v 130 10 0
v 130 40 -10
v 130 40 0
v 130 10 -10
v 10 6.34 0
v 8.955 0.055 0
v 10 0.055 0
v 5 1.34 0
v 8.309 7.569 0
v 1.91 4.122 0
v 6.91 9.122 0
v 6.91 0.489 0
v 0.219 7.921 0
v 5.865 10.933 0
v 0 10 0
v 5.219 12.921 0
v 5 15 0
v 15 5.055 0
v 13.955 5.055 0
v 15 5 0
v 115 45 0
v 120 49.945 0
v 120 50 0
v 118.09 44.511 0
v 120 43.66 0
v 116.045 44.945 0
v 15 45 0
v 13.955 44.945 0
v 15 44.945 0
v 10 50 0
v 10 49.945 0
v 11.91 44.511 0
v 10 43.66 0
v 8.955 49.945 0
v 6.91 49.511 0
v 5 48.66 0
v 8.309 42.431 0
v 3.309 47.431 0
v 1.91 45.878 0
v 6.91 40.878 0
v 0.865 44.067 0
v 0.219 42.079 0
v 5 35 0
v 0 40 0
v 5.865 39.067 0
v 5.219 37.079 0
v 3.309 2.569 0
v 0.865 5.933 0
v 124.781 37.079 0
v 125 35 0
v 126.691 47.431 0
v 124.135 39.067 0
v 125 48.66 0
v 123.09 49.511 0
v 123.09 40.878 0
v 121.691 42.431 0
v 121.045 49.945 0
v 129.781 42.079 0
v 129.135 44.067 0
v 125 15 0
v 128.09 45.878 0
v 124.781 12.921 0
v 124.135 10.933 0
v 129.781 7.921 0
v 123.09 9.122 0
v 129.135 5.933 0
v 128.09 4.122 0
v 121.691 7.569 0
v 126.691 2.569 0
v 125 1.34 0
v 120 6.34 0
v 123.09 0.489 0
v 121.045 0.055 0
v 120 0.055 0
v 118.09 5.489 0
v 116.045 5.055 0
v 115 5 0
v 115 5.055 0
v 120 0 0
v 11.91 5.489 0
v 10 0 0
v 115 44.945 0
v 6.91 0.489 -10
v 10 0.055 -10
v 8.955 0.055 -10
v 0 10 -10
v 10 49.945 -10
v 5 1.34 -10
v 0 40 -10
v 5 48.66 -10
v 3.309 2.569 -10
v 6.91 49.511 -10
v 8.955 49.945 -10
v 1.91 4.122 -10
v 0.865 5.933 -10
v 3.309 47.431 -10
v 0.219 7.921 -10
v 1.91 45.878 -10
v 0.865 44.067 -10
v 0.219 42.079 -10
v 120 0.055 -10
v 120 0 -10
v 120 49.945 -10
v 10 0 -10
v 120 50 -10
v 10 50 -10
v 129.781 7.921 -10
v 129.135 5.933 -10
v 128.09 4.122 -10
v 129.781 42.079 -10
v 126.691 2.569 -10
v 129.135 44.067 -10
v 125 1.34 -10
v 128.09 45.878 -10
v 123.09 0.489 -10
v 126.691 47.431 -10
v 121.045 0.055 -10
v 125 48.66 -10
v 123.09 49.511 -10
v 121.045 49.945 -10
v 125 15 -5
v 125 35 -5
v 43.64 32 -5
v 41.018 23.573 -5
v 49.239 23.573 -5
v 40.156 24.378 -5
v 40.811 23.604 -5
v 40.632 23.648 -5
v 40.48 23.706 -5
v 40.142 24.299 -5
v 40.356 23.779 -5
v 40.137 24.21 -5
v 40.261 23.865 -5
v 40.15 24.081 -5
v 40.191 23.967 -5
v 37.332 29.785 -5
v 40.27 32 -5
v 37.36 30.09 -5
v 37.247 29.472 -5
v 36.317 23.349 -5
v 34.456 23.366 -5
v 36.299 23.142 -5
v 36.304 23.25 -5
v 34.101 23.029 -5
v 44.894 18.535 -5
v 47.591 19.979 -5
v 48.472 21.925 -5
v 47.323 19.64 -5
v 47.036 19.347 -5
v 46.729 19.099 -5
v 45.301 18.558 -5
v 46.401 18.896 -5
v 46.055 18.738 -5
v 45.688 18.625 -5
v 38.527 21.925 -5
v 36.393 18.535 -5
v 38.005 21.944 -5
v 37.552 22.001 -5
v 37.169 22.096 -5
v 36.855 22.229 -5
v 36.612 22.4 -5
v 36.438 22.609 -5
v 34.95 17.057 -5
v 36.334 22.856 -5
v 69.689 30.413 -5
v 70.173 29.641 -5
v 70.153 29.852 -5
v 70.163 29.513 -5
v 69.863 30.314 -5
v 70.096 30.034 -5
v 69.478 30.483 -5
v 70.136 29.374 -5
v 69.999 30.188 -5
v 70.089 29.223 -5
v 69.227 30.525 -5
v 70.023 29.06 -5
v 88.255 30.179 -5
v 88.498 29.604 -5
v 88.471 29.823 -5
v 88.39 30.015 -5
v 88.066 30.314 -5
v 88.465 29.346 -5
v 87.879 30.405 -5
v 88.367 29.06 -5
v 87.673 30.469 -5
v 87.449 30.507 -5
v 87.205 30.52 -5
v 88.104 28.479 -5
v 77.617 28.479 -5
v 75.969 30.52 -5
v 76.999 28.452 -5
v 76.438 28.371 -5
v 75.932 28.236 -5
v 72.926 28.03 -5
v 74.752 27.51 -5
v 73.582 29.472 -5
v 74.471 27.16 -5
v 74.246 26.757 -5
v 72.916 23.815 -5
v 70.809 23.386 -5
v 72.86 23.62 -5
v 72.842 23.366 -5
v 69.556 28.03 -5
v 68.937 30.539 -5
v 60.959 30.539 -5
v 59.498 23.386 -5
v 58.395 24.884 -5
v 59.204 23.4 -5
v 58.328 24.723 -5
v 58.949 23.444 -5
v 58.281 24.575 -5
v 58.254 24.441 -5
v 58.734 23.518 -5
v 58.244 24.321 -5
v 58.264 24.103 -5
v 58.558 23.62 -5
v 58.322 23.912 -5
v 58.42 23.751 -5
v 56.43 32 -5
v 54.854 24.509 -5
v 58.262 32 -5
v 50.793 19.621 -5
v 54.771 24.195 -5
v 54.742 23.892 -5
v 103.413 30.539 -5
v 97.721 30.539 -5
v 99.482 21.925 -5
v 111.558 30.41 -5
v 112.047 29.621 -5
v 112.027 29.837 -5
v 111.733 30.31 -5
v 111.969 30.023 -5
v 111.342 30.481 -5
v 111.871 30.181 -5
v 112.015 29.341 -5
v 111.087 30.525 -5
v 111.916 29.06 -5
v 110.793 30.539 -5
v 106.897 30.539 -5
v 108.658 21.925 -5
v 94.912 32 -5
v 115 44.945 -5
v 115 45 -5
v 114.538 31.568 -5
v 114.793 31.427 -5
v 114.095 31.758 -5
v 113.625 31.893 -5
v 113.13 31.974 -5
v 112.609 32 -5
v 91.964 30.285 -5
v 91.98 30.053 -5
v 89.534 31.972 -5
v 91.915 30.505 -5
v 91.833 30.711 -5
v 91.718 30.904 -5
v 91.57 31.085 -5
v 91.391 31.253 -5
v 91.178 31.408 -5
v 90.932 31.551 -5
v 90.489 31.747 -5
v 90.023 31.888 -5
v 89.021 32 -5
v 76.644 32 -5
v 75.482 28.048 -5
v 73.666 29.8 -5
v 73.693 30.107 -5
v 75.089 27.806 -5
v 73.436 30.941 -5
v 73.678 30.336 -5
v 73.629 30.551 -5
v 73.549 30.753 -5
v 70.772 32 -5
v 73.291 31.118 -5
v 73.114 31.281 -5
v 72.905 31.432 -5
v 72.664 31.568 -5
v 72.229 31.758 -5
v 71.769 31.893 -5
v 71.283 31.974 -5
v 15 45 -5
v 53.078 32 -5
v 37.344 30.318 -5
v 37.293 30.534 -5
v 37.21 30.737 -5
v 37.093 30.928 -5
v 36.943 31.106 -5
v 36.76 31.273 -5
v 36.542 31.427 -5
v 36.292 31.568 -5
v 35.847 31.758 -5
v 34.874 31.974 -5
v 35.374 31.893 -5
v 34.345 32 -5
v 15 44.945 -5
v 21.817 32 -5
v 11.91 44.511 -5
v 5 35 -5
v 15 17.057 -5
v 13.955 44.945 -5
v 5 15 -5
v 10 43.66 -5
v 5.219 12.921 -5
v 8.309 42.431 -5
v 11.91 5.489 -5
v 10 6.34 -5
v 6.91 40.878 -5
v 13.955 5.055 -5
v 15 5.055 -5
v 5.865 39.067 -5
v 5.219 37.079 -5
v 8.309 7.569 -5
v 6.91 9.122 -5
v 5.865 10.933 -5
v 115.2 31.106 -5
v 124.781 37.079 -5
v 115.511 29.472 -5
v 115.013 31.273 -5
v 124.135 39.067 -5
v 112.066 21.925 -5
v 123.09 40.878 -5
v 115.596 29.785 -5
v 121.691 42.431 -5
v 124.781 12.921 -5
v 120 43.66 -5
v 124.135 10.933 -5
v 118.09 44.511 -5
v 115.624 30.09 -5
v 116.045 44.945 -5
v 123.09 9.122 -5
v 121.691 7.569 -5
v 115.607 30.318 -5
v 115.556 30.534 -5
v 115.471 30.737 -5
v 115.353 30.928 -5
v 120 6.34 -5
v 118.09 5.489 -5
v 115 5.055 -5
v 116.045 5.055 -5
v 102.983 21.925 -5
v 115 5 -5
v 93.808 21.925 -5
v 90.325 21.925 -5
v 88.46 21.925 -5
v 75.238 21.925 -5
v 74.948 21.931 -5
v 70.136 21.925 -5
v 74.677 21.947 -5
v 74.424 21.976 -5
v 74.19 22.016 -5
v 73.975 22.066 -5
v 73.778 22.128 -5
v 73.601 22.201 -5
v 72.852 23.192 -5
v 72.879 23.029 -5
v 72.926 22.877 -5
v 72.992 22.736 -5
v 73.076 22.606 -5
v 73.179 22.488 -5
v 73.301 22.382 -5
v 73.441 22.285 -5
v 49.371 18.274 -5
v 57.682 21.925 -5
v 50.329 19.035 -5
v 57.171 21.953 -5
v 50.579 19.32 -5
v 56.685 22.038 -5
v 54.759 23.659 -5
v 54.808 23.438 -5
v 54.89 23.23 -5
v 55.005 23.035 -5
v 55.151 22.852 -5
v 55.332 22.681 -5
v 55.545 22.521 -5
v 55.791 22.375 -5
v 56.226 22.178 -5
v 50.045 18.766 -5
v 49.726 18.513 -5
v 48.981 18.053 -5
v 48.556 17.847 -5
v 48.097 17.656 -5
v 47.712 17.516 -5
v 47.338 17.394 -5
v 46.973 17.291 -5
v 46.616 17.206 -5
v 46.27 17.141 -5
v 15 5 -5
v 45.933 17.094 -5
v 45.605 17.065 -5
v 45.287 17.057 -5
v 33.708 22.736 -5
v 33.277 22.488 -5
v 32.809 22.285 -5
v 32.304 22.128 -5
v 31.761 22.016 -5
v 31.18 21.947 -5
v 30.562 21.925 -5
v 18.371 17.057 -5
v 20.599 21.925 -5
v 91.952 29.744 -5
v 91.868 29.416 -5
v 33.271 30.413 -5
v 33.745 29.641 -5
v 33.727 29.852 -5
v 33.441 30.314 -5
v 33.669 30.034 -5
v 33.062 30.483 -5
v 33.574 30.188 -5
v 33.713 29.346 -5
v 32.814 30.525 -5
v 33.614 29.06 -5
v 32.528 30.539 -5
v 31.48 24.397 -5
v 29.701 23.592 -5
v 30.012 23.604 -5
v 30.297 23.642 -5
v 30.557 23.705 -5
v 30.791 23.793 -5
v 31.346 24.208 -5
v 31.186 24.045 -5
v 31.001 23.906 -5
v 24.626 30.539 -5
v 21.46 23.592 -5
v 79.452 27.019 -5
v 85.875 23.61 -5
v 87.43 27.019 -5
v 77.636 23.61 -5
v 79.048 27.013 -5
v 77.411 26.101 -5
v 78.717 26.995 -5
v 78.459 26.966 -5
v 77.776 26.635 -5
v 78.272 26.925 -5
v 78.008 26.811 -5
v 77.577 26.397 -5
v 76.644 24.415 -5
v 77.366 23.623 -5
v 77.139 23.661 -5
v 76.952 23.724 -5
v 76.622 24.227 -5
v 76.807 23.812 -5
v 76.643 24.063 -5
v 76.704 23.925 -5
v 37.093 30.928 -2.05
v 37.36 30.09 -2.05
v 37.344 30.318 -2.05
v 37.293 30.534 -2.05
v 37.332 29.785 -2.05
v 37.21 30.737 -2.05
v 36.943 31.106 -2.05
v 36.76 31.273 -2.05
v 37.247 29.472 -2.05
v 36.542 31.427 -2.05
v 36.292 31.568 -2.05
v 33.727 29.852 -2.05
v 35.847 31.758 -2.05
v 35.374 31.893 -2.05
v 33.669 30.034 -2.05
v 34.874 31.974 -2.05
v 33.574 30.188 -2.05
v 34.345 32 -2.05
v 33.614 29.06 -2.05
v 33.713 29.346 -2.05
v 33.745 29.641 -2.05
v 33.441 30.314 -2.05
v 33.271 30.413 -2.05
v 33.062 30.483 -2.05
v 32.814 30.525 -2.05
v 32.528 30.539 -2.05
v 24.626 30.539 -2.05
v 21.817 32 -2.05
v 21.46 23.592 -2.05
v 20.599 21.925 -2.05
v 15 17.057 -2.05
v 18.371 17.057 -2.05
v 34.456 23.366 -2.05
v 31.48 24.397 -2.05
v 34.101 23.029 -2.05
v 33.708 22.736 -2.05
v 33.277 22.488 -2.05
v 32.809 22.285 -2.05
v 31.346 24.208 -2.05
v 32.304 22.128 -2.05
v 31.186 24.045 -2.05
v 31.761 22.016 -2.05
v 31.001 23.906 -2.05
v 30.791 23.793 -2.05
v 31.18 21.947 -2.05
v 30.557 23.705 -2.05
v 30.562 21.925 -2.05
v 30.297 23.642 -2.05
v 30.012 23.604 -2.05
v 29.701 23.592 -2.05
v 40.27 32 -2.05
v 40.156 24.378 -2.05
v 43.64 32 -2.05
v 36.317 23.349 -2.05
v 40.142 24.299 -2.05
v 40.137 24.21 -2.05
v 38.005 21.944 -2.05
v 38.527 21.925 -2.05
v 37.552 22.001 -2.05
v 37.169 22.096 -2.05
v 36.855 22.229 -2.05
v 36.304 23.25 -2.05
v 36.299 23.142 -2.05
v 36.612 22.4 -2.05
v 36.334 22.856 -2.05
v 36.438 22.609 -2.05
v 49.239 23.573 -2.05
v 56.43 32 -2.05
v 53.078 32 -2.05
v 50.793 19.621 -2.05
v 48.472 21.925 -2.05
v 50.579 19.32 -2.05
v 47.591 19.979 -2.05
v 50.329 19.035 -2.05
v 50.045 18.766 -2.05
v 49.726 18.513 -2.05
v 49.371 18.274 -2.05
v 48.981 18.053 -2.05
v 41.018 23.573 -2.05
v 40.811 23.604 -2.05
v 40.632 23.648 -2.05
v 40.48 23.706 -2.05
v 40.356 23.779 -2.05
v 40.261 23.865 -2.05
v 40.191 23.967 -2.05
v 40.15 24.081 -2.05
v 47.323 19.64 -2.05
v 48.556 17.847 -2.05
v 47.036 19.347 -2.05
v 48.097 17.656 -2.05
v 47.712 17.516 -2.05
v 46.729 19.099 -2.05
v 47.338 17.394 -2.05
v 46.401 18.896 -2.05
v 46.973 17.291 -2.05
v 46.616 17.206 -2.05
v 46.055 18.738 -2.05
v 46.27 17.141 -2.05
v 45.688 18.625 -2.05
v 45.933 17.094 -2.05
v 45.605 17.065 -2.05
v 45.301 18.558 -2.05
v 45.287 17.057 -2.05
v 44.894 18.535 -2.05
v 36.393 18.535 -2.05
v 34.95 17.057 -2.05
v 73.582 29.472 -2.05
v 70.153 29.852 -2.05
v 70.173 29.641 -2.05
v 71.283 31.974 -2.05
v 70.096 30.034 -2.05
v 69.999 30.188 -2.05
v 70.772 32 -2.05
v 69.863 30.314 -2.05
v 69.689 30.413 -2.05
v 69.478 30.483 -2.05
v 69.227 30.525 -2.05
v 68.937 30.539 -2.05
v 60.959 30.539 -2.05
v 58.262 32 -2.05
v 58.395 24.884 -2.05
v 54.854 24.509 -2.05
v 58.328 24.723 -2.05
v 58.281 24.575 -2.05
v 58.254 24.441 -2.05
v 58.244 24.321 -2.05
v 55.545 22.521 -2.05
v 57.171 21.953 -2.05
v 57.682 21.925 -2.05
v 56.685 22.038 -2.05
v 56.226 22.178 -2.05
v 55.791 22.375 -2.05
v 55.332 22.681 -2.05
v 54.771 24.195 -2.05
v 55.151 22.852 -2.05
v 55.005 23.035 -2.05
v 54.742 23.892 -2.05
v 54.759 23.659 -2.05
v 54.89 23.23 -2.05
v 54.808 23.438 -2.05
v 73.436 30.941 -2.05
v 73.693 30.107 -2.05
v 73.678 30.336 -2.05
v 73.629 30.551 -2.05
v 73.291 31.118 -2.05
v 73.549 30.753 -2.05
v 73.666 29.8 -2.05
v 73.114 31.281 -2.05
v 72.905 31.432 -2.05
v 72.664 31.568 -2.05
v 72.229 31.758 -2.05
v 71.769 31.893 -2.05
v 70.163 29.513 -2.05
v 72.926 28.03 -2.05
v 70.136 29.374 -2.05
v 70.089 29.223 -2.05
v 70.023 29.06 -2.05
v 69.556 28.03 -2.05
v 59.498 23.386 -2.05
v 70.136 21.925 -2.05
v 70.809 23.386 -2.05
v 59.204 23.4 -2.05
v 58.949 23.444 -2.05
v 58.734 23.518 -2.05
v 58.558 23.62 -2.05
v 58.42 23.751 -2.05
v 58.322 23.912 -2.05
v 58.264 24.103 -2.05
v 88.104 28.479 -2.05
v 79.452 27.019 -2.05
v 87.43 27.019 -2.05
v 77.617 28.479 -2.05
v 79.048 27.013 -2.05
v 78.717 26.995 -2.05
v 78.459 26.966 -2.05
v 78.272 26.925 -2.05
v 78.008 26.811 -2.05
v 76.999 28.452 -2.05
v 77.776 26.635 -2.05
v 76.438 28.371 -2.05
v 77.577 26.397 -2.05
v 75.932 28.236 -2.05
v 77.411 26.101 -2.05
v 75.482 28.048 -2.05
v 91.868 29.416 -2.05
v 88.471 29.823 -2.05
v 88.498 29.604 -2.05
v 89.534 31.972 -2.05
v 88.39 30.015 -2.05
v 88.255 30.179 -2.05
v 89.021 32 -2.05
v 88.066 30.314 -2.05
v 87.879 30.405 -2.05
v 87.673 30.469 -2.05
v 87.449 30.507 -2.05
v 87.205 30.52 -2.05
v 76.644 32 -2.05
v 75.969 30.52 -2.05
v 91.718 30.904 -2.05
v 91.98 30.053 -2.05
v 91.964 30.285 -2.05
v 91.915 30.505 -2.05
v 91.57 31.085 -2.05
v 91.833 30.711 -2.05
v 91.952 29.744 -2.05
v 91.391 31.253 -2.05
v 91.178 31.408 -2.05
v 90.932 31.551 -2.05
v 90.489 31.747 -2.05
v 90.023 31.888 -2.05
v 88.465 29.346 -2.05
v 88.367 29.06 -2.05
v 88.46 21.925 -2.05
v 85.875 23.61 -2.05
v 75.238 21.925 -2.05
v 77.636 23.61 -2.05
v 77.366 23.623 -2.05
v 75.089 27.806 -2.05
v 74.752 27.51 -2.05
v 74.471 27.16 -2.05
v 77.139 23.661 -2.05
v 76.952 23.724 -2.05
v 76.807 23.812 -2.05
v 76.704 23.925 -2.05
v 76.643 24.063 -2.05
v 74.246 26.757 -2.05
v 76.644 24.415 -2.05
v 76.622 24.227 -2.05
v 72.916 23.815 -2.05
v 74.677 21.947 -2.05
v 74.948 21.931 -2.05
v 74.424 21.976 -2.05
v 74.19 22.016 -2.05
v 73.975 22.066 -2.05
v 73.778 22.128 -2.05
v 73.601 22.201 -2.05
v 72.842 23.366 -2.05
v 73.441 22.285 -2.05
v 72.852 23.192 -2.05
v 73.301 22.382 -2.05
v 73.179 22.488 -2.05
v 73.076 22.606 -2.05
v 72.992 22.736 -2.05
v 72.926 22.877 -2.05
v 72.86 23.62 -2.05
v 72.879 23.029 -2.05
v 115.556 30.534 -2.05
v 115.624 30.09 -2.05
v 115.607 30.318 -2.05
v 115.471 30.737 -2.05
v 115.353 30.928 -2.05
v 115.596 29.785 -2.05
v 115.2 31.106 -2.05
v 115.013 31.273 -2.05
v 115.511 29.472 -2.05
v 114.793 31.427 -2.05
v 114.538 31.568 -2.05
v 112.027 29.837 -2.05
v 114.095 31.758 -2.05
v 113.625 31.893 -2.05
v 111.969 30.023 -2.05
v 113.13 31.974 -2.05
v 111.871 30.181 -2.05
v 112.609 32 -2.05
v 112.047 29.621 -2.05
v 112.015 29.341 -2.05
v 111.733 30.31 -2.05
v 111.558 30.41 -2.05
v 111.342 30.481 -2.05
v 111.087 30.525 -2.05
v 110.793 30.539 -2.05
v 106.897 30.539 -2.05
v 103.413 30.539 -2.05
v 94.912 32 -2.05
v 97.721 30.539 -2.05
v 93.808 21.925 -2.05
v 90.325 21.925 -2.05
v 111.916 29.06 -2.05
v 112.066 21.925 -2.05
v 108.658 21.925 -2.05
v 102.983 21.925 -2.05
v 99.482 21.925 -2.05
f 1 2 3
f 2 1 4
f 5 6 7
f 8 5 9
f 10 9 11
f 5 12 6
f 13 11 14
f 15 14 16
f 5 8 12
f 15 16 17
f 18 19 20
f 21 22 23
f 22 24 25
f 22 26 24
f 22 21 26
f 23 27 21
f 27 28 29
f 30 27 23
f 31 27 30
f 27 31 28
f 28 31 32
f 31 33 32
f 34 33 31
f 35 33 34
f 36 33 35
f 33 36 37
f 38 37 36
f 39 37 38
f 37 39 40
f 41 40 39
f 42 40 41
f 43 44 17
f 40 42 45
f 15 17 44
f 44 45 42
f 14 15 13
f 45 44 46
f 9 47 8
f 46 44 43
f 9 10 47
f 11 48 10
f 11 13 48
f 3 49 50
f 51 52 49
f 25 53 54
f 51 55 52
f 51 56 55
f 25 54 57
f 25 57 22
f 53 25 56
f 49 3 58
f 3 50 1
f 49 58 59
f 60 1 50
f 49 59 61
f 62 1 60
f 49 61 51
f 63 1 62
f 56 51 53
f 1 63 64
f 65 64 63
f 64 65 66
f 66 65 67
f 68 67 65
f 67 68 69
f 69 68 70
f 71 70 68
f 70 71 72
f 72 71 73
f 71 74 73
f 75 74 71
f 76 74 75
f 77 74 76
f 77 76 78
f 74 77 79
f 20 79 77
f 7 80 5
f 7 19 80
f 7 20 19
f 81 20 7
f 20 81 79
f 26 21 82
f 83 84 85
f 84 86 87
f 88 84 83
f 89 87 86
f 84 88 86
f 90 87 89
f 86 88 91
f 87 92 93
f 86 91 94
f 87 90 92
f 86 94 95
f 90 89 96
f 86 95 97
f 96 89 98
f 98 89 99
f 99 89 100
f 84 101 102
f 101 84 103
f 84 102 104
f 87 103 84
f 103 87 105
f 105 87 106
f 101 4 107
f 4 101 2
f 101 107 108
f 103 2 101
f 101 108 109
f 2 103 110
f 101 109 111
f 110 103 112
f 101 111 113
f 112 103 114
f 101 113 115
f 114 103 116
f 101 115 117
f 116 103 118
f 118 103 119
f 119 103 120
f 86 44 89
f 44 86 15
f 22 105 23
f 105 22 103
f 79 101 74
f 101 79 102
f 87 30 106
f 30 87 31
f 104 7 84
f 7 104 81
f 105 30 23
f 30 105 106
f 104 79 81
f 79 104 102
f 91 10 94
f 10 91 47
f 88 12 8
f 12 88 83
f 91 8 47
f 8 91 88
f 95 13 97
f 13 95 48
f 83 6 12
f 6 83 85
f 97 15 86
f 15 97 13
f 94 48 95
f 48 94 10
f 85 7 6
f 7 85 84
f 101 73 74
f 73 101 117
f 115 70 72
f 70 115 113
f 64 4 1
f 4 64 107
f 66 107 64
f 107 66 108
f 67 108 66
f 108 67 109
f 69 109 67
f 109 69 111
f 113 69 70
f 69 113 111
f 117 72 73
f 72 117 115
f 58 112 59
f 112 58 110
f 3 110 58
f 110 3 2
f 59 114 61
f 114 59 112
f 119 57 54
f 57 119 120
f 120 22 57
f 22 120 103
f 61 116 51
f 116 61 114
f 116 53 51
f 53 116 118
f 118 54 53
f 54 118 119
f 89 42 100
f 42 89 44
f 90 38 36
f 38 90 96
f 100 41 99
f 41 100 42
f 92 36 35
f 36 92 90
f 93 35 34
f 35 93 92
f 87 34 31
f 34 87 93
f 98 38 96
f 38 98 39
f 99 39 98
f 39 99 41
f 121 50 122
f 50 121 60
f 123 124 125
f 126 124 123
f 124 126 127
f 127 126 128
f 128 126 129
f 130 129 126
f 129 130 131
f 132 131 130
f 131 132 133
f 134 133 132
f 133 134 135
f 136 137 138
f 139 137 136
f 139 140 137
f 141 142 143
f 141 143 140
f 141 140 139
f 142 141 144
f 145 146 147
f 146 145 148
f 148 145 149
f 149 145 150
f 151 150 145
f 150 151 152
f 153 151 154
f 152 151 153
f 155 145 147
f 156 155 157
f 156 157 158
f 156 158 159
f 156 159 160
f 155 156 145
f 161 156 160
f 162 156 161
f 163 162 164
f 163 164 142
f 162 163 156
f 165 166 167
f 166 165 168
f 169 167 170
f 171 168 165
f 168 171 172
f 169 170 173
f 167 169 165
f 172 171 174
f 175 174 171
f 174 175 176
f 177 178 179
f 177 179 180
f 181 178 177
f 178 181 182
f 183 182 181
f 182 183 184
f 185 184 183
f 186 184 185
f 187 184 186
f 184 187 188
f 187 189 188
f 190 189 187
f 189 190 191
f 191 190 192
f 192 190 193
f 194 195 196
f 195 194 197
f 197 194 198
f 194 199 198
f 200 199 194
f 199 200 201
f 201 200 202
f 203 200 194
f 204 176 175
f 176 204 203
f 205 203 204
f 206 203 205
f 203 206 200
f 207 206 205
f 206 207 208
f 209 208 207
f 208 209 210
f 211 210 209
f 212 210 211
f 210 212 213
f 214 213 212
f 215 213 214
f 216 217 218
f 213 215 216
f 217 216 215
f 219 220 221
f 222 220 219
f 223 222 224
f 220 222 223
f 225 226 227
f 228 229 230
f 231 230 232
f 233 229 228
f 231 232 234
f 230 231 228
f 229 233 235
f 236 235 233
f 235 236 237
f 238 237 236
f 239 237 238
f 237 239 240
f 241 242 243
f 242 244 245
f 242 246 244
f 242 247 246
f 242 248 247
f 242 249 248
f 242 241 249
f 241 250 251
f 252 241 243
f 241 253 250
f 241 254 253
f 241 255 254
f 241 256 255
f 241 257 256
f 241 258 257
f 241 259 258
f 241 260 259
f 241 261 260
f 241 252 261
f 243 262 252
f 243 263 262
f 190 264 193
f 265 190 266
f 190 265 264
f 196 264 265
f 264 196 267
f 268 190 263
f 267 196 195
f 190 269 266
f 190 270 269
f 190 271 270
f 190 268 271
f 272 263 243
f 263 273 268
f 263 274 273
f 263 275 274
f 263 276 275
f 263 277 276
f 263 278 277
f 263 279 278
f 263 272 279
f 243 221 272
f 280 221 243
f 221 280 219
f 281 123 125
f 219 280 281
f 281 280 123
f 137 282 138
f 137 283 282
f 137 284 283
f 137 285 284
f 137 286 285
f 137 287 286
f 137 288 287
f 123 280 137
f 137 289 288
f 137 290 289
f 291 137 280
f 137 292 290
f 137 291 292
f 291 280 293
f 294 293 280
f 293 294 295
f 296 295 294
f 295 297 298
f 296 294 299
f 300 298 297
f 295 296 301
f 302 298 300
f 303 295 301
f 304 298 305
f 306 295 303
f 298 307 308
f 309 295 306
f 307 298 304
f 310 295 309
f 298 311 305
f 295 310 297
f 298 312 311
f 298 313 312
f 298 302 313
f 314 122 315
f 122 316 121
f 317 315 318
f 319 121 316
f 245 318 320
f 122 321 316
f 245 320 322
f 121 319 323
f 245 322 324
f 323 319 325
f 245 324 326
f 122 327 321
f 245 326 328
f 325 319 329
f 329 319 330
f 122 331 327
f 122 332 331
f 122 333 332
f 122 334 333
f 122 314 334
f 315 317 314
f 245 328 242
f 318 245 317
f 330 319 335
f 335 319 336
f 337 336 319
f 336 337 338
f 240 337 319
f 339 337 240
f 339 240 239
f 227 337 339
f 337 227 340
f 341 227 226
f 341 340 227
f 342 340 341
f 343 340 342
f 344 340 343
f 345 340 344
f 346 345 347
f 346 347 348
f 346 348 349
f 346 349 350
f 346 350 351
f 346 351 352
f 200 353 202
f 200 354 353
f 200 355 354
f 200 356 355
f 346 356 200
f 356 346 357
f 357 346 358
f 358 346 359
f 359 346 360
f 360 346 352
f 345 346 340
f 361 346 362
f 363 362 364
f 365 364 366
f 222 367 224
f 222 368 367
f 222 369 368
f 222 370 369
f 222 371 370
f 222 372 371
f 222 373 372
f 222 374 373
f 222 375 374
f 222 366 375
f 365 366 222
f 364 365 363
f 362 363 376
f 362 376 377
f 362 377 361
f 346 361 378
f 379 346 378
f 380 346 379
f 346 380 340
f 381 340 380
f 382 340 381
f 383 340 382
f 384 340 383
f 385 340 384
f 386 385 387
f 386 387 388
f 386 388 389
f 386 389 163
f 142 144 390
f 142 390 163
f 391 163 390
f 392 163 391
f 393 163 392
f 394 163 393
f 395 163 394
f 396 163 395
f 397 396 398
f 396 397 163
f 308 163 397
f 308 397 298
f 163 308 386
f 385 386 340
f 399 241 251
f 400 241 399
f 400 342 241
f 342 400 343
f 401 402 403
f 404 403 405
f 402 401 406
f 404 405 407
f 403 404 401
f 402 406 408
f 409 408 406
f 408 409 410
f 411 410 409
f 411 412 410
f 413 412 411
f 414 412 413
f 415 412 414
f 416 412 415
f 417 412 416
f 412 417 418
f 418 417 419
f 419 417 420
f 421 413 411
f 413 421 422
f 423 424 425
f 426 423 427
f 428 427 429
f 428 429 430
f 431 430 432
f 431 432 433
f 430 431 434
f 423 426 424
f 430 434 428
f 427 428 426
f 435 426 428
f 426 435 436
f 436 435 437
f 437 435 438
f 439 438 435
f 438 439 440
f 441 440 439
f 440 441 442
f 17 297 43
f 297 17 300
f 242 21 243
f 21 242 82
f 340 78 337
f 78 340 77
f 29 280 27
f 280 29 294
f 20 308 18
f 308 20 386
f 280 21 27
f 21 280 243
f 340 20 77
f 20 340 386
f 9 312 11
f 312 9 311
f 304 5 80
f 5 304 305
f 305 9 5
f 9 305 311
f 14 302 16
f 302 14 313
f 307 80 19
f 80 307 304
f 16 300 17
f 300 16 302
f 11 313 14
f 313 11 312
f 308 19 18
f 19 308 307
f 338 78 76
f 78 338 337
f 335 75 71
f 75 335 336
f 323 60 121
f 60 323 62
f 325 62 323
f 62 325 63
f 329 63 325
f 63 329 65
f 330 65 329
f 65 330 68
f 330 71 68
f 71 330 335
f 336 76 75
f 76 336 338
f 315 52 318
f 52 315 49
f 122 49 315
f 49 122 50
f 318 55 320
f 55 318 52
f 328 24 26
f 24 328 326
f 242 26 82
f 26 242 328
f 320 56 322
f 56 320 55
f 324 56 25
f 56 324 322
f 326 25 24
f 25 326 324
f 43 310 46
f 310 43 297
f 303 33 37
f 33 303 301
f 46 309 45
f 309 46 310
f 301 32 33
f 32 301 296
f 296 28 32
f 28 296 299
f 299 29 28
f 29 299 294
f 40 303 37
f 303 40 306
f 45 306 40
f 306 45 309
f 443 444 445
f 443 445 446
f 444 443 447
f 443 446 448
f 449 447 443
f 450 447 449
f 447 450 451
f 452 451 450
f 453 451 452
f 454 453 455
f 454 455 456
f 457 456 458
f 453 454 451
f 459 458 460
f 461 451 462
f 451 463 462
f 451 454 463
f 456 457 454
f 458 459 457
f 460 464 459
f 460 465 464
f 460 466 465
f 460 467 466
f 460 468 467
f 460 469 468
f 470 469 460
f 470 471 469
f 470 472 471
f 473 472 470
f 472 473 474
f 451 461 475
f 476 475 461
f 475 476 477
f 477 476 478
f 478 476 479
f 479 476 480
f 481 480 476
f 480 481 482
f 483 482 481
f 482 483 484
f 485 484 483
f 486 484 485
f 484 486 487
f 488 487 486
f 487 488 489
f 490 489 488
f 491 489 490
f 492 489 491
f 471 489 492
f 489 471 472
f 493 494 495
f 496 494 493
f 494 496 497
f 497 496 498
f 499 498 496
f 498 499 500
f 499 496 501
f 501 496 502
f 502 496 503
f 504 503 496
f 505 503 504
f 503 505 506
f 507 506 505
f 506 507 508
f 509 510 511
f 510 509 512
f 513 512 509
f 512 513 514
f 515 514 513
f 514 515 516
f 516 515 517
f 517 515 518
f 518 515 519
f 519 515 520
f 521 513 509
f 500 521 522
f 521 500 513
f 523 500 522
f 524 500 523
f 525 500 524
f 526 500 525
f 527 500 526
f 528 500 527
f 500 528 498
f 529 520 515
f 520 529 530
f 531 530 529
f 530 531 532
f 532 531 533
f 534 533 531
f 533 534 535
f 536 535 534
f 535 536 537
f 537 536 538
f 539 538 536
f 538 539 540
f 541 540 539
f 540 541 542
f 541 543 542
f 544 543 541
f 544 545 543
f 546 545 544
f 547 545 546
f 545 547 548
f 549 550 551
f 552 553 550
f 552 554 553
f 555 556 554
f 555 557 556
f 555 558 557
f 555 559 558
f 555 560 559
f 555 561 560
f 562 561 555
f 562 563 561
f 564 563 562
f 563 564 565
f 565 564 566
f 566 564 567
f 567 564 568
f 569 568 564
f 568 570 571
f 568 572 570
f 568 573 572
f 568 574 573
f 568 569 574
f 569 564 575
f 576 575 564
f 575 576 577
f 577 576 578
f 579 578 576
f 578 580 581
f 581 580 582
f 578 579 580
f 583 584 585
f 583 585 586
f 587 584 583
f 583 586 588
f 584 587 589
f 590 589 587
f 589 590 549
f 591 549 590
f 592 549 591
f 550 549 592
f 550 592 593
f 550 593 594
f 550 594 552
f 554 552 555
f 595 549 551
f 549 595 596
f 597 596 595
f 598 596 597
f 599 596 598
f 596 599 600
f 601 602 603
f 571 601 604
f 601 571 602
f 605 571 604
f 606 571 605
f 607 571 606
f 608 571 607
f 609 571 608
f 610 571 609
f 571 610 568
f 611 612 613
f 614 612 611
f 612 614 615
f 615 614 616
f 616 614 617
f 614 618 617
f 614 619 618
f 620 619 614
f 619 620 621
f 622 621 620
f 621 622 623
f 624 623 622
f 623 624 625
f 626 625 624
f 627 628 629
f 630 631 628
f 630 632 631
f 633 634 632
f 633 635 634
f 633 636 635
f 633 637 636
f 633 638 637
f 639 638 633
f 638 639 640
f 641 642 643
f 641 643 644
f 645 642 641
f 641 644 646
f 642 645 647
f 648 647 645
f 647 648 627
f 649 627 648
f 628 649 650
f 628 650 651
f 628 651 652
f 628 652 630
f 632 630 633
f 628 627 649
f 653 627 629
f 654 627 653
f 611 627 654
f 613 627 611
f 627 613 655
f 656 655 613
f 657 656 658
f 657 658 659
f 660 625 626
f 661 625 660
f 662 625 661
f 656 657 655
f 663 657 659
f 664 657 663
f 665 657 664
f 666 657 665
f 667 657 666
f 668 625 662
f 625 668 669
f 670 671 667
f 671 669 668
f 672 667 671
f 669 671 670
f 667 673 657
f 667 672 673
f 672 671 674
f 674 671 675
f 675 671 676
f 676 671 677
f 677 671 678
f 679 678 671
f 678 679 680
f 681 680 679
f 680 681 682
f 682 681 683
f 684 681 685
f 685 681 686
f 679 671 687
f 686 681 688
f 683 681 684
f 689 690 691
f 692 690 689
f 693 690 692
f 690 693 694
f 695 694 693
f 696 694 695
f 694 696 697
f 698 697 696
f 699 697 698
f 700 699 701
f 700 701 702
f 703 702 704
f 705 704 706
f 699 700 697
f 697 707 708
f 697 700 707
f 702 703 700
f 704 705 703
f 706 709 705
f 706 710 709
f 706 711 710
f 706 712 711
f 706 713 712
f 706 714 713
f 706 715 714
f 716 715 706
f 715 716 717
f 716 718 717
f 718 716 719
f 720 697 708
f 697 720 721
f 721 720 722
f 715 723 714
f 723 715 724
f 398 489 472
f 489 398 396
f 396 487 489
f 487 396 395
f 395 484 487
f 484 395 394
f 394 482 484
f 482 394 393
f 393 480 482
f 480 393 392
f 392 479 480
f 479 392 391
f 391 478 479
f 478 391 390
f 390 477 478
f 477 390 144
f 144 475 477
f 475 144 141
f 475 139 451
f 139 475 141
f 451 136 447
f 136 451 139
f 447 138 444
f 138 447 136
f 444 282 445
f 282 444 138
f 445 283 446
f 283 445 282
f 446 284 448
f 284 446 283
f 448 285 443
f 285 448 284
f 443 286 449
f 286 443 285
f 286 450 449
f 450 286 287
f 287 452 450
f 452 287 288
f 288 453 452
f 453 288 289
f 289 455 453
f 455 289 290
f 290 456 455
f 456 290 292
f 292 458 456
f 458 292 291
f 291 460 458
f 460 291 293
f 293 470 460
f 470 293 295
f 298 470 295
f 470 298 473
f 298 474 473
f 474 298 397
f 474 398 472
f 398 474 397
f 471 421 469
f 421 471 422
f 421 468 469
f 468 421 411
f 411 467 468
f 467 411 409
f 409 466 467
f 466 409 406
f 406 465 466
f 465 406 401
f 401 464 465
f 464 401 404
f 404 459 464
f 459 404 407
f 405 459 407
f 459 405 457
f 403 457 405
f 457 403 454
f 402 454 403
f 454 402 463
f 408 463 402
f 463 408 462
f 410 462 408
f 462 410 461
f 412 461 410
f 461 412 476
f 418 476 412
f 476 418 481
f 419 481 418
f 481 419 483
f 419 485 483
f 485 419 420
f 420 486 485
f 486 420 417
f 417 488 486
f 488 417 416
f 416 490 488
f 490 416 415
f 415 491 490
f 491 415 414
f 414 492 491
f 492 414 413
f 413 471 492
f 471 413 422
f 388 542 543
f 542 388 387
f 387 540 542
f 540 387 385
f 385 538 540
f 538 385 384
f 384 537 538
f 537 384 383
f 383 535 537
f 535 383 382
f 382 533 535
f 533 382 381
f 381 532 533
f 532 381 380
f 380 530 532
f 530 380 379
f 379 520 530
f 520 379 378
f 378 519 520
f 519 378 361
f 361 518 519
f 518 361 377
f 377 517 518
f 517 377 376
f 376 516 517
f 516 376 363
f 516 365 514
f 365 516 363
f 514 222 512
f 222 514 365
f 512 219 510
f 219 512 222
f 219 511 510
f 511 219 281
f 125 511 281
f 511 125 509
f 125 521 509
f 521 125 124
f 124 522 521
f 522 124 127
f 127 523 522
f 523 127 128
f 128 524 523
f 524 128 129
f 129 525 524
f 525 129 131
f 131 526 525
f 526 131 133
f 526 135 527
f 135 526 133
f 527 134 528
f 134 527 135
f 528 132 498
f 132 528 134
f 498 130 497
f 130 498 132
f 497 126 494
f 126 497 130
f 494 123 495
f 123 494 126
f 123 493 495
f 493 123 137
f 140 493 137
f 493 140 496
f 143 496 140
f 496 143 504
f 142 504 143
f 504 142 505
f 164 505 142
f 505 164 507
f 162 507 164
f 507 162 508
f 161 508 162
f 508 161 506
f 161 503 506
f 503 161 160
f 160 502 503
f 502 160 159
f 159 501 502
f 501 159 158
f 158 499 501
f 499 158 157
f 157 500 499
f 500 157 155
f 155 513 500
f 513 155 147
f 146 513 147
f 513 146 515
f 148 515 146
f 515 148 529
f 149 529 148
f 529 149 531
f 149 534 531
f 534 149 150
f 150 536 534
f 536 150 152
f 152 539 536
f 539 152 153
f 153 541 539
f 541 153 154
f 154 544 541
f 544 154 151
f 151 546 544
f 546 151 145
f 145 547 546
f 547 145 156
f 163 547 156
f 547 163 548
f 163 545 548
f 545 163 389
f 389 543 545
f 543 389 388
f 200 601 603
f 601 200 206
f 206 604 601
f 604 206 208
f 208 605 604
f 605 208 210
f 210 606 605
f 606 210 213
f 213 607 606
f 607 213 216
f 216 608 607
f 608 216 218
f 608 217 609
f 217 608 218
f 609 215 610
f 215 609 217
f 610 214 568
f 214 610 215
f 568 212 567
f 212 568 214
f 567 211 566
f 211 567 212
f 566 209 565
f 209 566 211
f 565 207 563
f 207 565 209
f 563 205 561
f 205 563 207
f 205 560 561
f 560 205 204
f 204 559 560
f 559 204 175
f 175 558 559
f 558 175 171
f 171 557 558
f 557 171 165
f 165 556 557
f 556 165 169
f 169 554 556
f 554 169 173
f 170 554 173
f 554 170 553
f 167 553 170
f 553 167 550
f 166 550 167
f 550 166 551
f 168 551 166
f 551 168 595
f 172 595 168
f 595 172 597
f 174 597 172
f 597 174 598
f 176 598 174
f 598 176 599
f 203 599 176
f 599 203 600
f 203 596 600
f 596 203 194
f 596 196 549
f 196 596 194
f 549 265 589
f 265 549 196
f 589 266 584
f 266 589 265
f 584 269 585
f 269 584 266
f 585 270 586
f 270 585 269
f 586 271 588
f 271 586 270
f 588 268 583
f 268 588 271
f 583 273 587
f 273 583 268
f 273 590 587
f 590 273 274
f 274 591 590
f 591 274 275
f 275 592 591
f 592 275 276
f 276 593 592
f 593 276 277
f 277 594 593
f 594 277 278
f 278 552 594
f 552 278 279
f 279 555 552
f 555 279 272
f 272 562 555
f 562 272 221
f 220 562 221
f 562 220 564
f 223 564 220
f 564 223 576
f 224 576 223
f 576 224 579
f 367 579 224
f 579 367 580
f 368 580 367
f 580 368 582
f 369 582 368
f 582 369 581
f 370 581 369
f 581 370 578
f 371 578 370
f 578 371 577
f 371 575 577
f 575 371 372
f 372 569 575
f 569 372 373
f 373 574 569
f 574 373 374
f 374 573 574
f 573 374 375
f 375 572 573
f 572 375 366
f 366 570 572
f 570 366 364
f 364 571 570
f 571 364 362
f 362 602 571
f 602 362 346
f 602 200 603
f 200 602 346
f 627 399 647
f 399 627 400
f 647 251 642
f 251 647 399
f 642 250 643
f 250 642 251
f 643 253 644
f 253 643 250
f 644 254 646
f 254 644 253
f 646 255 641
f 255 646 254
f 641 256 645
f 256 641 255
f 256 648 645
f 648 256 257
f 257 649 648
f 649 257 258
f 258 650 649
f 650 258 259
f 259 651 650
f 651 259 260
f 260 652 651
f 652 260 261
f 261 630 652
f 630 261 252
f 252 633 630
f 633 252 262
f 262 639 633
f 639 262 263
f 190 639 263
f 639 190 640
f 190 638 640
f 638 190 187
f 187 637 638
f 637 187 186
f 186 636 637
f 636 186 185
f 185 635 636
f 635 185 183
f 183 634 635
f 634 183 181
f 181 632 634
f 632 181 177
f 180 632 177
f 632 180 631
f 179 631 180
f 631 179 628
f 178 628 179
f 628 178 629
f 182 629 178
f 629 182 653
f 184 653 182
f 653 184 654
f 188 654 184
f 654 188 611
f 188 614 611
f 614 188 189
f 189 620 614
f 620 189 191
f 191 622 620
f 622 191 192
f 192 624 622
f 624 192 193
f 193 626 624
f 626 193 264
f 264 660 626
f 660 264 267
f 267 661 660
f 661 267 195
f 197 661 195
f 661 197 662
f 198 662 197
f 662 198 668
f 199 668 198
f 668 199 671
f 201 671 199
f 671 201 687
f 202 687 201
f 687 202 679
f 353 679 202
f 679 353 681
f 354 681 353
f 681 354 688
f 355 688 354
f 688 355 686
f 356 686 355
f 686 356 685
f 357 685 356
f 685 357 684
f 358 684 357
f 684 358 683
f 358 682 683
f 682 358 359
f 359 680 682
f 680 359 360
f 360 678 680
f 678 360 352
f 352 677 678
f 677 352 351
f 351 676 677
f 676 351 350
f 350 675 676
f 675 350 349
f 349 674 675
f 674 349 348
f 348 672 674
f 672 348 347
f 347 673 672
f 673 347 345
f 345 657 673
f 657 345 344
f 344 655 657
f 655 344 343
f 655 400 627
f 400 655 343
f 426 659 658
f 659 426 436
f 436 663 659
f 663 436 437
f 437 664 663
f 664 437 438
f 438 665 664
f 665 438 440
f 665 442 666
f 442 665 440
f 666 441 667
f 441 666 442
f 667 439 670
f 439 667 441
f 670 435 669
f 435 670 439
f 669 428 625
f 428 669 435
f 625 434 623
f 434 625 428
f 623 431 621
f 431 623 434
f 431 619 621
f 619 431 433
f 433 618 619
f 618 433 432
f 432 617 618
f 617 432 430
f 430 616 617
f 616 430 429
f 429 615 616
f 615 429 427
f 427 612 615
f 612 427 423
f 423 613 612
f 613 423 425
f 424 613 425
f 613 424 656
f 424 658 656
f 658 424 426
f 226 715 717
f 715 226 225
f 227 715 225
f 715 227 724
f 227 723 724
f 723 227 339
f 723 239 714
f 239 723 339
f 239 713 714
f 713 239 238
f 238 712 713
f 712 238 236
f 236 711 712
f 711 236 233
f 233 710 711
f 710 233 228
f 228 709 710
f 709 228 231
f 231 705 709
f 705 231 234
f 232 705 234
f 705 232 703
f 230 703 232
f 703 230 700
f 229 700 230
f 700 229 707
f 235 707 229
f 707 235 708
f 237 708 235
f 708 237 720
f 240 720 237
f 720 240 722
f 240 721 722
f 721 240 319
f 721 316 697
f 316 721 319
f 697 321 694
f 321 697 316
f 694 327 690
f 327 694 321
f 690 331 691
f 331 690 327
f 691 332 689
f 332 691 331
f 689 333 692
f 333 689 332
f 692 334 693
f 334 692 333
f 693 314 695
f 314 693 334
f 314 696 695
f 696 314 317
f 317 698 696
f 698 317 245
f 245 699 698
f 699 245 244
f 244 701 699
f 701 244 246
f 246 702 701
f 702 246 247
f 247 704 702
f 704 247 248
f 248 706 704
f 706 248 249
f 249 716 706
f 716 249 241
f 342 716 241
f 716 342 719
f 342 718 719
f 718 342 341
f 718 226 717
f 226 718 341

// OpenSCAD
// Combine the PyCAM logo with a slightly depressed rounded-cornered box.

module block(a, b, height, radius) {
	translate([radius, radius, 0]) union() {
		translate([-radius, 0, 0]) cube([a, b - 2 * radius, height]);
		translate([0, -radius, 0]) cube([a - 2 * radius, b, height]);
		cylinder(r=radius, h=height);
		translate([a - 2 * radius, 0, 0]) cylinder(r=radius, h=height);
		translate([a - 2 * radius, b - 2 * radius, 0]) cylinder(r=radius, h=height);
		translate([0, b - 2 * radius, 0]) cylinder(r=radius, h=height);
	}
}

translate([0, 0, -10]) difference() {
	block(130, 50, 10, 10);
	translate([5, 5, 5]) block(120, 40, 6, 10);
}
translate([15, 17, -5.05]) linear_extrude(file="pycam-text.dxf", height=3);
